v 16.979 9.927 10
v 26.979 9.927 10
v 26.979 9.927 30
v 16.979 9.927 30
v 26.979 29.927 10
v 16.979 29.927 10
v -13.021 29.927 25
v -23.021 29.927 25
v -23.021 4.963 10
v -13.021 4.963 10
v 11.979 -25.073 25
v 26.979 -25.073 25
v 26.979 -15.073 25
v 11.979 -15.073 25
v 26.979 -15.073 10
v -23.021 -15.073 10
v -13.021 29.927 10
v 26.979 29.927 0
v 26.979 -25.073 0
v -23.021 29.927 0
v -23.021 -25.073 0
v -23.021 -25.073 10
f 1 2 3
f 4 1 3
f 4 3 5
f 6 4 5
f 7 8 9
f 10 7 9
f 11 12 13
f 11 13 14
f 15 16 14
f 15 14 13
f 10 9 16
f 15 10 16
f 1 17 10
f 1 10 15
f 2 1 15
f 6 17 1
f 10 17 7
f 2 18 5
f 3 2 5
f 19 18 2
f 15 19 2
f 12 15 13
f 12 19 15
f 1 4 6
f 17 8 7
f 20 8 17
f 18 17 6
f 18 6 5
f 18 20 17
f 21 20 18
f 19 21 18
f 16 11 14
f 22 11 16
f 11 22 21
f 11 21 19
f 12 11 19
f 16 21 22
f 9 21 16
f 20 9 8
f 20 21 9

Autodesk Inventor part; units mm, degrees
ref_plane "YZ Plane" through (0, 0, 0) normal (1, 0, 0) x (0, 1, 0)
ref_plane "XZ Plane" through (0, 0, 0) normal (0, 1, 0) x (-1, 0, 0)
ref_plane "XY Plane" through (0, 0, 0) normal (0, 0, 1) x (1, 0, 0)
sketch "Sketch1" plane through (0, 0, 0) normal (0, 0, 1) x (1, 0, 0)
  line L0 (-23.0214, 29.9269) -> (26.9786, 29.9269)
  line L1 (26.9786, 29.9269) -> (26.9786, -25.0731)
  line L2 (26.9786, -25.0731) -> (-23.0214, -25.0731)
  line L3 (-23.0214, -25.0731) -> (-23.0214, 29.9269)
  point P0 (0, 0)
  dimension "d0" = 55
  dimension "d1" = 50
  dimension "d4" = 55
  dimension "d5" = 50
extrude "Extrusion1" add sketch "Sketch1" along normal blind 10
ref_plane "Work Plane1" through (-23.0214, -25.0731, 0) normal (-1, 0, 0) x (0, 0, 1)
sketch "Sketch3" plane through (-23.0214, -25.0731, 0) normal (-1, 0, 0) x (0, 0, 1)
  line L0 (10, 0) -> (10, 55) projected
  line L1 (10, 55) -> (25, 55)
  line L2 (25, 55) -> (9.9866, 30.0136)
  line L3 (10, 55) -> (9.9866, 30.0136)
  line L4 (10, 55) -> (9.9866, 30.0136)
  point P0 (0, 25.0731)
  point P1 (10, 30.0358)
  dimension "d10" = 15
  dimension "d14" = 29.15
  dimension "d15" = 59
  dimension "d16" = 55
extrude "Extrusion2" add sketch "Sketch3" against normal blind 10 contours L0 L1 L2
ref_plane "Work Plane2" through (26.9786, -25.0731, 0) normal (1, 0, 0) x (0, 0, -1)
sketch "Sketch4" plane through (26.9786, -25.0731, 0) normal (1, 0, 0) x (0, 0, -1)
  line L0 (-10, 0) -> (-10, 55) projected
  line L1 (-10, 35) -> (-30, 35)
  line L2 (-30, 35) -> (-10, 55)
  line L3 (-10, 55) -> (-10, 35)
  point P0 (0, 25.0731)
  dimension "d20" = 20
  dimension "d21" = 20
  dimension "d22" = 28.2843
  dimension "d23" = 45
extrude "Extrusion3" add sketch "Sketch4" against normal blind 10
ref_plane "Work Plane3" through (-23.0214, -25.0731, 0) normal (0, -1, 0) x (1, 0, 0)
sketch "Sketch5" plane through (-23.0214, -25.0731, 0) normal (0, -1, 0) x (1, 0, 0)
  line L0 (50, 0) -> (50, 10) projected
  line L1 (50, 10) -> (50, 25)
  line L2 (50, 25) -> (35, 25)
  line L3 (35, 25) -> (0, 10)
  line L4 (0, 10) -> (50, 10)
  point P0 (23.0214, 0)
  point P1 (0, 25)
  dimension "d27" = 15
  dimension "d28" = 15
  dimension "d29" = 38.0789
  dimension "d30" = 35
extrude "Extrusion4" add sketch "Sketch5" against normal blind 10
